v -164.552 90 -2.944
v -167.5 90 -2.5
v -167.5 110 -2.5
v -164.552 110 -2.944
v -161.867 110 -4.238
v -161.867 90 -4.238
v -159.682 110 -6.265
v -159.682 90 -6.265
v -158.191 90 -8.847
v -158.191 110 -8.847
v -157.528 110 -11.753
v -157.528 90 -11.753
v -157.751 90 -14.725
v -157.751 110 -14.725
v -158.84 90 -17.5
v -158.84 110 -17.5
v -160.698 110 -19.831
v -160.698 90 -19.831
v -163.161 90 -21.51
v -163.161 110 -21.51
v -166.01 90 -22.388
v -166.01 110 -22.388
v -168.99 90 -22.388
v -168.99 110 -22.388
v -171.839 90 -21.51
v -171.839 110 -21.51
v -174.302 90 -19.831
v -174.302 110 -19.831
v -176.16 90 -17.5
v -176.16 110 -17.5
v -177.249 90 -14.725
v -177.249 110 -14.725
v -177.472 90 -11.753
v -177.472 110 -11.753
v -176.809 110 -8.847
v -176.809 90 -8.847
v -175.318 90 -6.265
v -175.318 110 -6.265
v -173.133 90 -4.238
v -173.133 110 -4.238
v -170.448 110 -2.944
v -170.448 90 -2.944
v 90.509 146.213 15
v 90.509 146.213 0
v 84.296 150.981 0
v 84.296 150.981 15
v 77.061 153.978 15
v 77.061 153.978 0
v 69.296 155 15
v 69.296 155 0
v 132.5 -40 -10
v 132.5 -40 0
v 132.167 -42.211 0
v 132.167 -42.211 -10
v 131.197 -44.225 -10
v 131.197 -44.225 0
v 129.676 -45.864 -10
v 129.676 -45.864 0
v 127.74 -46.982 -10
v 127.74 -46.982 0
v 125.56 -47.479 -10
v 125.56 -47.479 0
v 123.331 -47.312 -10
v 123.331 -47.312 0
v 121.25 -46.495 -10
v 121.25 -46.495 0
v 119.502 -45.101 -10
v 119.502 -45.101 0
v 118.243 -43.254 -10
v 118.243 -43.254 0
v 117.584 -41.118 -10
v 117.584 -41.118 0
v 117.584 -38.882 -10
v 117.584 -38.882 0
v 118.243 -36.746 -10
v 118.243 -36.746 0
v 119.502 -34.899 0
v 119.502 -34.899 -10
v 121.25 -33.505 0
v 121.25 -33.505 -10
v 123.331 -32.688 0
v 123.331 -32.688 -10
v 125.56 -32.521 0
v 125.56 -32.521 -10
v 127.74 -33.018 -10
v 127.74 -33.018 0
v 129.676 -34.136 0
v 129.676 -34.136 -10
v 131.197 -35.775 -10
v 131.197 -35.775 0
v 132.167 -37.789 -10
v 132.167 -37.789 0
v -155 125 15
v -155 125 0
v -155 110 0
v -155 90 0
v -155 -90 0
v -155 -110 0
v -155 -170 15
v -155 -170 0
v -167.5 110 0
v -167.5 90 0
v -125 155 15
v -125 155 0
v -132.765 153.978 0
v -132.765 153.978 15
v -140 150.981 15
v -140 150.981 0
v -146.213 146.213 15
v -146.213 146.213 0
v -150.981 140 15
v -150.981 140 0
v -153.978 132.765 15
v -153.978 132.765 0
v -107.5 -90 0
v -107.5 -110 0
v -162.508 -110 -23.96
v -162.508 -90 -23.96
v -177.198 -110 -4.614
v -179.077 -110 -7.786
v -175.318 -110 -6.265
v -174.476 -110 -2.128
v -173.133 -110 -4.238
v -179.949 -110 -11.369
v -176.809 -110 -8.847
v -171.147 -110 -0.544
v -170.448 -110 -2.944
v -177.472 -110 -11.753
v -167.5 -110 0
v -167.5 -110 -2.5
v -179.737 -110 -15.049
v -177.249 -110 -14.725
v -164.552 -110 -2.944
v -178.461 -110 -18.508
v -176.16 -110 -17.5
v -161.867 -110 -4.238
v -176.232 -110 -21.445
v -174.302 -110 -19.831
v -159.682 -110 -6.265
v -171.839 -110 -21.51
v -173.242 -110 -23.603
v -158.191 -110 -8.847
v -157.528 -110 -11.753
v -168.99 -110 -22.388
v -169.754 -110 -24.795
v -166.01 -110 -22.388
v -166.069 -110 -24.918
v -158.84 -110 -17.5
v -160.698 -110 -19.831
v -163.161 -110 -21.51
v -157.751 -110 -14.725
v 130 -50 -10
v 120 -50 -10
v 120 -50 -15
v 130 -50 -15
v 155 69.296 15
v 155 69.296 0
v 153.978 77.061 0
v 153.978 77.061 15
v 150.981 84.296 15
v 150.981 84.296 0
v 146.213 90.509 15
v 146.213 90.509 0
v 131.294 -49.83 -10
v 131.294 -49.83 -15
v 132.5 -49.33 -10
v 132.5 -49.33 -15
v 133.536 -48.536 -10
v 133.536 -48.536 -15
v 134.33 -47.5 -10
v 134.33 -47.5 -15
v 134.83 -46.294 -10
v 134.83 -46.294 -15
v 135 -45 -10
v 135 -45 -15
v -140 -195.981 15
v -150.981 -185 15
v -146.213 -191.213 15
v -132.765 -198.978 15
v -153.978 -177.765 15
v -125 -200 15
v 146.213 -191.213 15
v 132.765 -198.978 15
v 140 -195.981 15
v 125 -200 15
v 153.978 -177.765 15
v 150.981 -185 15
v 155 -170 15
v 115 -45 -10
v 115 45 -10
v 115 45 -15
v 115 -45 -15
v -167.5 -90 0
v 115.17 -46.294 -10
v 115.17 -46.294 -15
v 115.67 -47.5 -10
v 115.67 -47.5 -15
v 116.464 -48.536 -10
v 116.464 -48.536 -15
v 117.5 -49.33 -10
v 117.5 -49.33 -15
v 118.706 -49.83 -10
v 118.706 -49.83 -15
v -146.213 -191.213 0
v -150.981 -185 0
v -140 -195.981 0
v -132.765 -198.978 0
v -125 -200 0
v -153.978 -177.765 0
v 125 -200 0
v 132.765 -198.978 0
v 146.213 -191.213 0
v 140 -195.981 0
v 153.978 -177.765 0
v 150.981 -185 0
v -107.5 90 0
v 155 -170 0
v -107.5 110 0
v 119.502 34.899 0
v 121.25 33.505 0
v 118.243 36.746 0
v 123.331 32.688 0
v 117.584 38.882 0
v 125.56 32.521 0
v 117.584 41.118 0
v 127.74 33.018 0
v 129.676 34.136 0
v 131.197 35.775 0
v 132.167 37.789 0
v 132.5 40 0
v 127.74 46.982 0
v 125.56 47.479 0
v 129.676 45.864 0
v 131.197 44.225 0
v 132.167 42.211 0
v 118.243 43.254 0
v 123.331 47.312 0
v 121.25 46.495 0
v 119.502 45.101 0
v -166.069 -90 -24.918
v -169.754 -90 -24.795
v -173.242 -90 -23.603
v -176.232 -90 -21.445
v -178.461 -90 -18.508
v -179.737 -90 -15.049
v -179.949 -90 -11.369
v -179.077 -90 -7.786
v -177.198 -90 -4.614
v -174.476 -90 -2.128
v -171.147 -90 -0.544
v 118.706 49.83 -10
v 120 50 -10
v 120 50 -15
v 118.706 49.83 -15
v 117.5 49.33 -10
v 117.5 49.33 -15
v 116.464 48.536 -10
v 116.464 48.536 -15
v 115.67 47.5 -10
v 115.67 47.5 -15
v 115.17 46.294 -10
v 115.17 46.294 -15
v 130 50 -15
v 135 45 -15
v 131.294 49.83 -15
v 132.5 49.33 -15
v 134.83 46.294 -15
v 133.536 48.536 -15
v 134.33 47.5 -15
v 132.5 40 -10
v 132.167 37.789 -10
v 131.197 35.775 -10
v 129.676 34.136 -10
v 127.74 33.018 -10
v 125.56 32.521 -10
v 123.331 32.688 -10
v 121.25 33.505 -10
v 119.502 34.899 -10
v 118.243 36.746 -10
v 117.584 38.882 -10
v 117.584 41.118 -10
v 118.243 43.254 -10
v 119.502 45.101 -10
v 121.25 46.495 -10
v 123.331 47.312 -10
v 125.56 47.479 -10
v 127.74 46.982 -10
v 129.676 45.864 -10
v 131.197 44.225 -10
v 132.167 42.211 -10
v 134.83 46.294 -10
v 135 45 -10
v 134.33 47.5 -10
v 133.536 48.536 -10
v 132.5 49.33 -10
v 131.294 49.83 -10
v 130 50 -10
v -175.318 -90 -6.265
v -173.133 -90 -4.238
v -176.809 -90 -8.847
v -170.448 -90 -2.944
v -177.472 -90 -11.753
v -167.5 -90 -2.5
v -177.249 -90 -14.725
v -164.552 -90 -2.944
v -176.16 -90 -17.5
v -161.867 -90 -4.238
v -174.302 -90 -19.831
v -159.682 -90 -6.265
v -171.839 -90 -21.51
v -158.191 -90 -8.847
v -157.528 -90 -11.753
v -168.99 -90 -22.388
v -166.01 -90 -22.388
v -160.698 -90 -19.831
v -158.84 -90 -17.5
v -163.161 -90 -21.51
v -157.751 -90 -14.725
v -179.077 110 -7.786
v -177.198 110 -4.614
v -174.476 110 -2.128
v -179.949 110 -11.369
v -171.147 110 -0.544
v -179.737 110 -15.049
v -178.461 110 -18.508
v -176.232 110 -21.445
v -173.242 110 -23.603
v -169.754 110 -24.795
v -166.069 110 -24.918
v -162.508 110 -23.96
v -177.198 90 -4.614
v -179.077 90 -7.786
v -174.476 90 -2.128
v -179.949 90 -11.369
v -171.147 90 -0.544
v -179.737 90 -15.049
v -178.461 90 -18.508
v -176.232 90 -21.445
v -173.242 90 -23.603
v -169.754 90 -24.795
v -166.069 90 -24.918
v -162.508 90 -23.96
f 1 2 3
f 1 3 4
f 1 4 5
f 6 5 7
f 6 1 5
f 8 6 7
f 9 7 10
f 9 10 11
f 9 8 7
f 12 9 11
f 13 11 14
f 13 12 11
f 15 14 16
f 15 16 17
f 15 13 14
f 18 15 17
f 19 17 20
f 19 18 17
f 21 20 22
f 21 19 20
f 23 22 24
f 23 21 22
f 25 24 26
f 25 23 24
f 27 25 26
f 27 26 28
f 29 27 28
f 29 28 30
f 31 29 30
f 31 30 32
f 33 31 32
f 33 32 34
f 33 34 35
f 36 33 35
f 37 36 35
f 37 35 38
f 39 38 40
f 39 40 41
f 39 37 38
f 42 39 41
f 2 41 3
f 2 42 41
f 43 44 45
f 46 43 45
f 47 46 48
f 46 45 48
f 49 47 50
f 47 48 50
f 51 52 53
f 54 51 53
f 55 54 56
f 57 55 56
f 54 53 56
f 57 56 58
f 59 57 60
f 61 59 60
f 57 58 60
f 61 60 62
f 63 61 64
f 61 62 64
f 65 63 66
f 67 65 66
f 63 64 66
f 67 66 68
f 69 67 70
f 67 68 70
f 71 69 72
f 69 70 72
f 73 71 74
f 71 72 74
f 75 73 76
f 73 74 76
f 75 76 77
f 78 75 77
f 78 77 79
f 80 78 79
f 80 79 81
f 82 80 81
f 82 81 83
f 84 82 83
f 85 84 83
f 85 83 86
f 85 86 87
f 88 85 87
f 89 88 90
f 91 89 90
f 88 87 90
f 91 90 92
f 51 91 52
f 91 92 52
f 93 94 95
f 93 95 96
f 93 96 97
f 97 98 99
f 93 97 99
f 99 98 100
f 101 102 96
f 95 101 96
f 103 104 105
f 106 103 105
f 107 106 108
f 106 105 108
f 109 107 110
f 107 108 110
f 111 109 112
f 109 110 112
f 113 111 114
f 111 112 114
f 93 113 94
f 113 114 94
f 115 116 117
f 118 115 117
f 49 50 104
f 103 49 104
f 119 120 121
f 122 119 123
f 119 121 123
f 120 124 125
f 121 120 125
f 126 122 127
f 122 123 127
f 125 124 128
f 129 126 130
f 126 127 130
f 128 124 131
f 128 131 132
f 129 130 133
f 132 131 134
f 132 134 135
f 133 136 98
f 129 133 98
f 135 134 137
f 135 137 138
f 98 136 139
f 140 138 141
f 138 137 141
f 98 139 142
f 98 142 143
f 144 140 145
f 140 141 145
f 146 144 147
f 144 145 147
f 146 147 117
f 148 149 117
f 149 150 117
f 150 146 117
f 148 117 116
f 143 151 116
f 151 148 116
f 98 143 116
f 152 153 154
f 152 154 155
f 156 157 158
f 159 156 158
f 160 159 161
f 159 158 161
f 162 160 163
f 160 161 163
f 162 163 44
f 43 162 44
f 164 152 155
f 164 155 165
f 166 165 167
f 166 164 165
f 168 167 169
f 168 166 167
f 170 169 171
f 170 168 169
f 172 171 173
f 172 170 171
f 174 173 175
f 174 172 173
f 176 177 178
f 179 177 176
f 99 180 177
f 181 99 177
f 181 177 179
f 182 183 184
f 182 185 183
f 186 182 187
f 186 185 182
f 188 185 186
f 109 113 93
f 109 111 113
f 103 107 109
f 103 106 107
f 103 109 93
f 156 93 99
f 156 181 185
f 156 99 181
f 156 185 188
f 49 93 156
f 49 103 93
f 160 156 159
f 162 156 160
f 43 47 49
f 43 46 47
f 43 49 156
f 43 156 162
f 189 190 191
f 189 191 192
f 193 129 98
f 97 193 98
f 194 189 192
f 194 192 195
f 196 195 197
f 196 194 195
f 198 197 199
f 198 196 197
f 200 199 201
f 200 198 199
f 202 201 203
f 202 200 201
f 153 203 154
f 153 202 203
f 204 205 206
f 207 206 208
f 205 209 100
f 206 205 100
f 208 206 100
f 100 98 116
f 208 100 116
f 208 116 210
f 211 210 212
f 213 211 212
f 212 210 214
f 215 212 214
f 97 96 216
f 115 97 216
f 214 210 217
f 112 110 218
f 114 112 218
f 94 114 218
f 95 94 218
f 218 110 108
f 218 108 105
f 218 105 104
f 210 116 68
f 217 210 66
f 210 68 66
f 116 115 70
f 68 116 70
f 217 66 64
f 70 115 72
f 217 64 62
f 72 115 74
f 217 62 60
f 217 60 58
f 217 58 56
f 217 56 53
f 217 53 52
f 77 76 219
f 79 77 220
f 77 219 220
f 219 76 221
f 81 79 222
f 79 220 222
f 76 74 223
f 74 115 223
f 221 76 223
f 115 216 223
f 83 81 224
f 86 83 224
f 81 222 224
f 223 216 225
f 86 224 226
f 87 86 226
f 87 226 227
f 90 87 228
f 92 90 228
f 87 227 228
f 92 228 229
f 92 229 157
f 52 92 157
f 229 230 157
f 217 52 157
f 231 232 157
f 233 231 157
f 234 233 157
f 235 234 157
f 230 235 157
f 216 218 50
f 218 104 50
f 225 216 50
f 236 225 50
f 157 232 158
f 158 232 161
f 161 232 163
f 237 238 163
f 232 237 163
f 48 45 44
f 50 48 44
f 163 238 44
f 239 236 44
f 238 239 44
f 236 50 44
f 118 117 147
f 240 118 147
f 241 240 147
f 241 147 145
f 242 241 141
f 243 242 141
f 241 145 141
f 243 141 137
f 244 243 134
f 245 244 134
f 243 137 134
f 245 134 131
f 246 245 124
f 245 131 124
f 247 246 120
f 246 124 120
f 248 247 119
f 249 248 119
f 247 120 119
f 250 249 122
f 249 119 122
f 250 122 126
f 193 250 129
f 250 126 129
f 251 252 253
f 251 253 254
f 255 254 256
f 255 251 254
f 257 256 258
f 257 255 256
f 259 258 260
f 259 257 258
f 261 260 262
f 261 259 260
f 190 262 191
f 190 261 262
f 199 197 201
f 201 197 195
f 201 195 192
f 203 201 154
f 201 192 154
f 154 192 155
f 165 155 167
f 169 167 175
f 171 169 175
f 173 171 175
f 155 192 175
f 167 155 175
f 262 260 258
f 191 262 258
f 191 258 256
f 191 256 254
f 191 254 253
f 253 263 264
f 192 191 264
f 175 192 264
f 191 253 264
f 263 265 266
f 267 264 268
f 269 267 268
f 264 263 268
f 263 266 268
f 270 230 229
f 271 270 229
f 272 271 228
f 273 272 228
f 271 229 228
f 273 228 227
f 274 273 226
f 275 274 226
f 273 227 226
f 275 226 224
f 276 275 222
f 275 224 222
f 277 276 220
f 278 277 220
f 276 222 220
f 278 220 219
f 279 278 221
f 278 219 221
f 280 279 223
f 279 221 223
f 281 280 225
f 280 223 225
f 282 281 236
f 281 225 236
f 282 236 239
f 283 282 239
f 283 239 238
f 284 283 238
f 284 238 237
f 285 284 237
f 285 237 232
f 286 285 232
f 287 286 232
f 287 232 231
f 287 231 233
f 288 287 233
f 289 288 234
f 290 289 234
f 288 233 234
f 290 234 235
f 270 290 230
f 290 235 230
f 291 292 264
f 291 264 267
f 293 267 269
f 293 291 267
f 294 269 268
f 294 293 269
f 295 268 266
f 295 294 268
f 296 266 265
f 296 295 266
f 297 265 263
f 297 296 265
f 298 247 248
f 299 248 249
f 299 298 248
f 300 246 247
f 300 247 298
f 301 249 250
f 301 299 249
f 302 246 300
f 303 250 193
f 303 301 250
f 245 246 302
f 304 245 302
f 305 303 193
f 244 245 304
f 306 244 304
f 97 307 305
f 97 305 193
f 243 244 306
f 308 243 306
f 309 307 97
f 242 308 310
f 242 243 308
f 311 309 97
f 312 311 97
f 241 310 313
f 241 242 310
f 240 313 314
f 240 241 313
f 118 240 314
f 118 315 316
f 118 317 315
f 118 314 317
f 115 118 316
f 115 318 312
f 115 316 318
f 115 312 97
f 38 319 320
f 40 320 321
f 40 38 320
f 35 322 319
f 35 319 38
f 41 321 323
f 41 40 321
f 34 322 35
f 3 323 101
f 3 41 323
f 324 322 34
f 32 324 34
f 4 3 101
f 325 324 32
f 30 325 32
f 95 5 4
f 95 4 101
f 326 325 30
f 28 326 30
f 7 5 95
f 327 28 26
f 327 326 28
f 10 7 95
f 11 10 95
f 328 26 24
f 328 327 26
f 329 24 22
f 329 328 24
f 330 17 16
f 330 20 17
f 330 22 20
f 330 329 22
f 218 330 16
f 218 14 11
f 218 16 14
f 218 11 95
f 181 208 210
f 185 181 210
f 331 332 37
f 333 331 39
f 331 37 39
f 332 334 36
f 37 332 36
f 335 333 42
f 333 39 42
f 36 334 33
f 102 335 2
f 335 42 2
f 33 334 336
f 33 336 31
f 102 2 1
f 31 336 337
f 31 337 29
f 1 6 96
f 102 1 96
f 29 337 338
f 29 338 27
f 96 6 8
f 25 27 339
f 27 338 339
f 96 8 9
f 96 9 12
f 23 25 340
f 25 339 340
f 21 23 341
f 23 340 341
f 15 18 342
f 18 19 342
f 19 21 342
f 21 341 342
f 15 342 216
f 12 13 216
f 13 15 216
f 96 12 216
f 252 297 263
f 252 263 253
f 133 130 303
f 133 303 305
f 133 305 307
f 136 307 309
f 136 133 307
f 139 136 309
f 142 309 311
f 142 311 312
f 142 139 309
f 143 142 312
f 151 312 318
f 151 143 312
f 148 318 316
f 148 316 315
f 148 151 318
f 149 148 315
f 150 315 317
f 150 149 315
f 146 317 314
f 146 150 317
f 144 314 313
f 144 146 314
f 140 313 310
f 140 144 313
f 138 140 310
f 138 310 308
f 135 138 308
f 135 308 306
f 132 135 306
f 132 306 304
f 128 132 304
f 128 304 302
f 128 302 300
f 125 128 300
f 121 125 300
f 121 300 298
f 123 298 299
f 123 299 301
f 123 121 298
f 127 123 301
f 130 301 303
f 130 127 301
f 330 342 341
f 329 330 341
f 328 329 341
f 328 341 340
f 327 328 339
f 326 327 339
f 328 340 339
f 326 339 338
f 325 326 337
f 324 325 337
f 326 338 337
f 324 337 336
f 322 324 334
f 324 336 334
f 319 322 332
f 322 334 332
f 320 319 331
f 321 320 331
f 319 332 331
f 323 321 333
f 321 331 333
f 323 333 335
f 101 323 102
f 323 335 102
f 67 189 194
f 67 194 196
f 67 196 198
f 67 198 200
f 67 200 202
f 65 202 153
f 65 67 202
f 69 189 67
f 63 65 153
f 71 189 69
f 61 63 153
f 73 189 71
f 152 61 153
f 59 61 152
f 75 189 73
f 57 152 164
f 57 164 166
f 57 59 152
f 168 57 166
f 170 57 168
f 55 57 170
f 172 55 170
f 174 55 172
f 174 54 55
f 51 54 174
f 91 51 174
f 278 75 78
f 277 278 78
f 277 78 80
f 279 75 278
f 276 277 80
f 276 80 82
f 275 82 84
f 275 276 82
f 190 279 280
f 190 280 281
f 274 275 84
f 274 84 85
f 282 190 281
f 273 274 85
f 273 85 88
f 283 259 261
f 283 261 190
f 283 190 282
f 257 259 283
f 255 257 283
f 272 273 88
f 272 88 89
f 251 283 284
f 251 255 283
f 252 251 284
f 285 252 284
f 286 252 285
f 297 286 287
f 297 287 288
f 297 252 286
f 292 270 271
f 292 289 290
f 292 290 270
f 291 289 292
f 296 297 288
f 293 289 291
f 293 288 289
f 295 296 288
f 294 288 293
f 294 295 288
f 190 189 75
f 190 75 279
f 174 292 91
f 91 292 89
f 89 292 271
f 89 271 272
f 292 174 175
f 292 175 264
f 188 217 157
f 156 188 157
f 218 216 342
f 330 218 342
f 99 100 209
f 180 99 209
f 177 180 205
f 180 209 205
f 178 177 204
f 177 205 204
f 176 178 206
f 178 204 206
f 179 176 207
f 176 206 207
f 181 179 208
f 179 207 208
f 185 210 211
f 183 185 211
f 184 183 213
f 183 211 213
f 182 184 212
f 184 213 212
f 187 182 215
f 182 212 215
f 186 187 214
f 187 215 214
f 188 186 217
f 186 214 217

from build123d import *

# Parameters (mm, degrees)
BOSS_EXTRUDE1_DEPTH      = 15
BOSS_EXTRUDE2_DEPTH      = 10
BOSS_EXTRUDE2_DEPTH_BACK = 10
SKETCH3_R                = 12.5
SKETCH3_R_2              = 10
BOSS_EXTRUDE3_DEPTH      = 10
BOSS_EXTRUDE3_DEPTH_BACK = 10
SKETCH4_R                = 12.5
SKETCH4_R_2              = 10
CUT_EXTRUDE1_DEPTH       = 46
SKETCH6_R                = 7.5
BOSS_EXTRUDE4_DEPTH      = 10
BOSS_EXTRUDE5_DEPTH      = 5


with BuildPart() as part:
    # Sketch1 → Boss-Extrude1 (new body)
    with BuildSketch(Plane.XY):
        Polygon((-155, 155), (-155, -200), (155, -200), (155, 81.722524266), (81.722524266, 155), align=None)
    extrude(amount=BOSS_EXTRUDE1_DEPTH)

    # Sketch3 → Boss-Extrude2 (add, two sides: drawn at the far end of the back side and taken through both)
    # profile 1 of 2: a face of its own
    with BuildSketch(Plane(origin=(0, 100, 0), x_dir=(1, 0, 0), z_dir=(0, 1, 0)).offset(-BOSS_EXTRUDE2_DEPTH_BACK)):
        with BuildLine():
            ThreePointArc((-155, 12.5), (-158.661165235, 3.661165235), (-167.5, 0))
            Line((-167.5, 0), (-107.5, 0))
            Line((-107.5, 0), (-162.508319468, 23.960066556))
            ThreePointArc((-162.508319468, 23.960066556), (-157.04423588, 19.350328216), (-155, 12.5))
        make_face()
    # profile 2 of 2: a face of its own
    with BuildSketch(Plane(origin=(0, 100, 0), x_dir=(1, 0, 0), z_dir=(0, 1, 0)).offset(-BOSS_EXTRUDE2_DEPTH_BACK)):
        with Locations((-167.5, 12.5)):
            Circle(SKETCH3_R)
        with Locations(Location((-167.5, 12.5, 0), (0, 0, 270))):
            Circle(SKETCH3_R_2, mode=Mode.SUBTRACT)
    extrude(amount=BOSS_EXTRUDE2_DEPTH + BOSS_EXTRUDE2_DEPTH_BACK)

    # Sketch4 → Boss-Extrude3 (add, two sides: drawn at the far end of the back side and taken through both)
    # profile 1 of 2: a face of its own
    with BuildSketch(Plane(origin=(0, -100, 0), x_dir=(1, 0, 0), z_dir=(0, 1, 0)).offset(-BOSS_EXTRUDE3_DEPTH_BACK)):
        with Locations((-167.5, 12.5)):
            Circle(SKETCH4_R)
        with Locations(Location((-167.5, 12.5, 0), (0, 0, 270))):
            Circle(SKETCH4_R_2, mode=Mode.SUBTRACT)
    # profile 2 of 2: a face of its own
    with BuildSketch(Plane(origin=(0, -100, 0), x_dir=(1, 0, 0), z_dir=(0, 1, 0)).offset(-BOSS_EXTRUDE3_DEPTH_BACK)):
        with BuildLine():
            Line((-107.5, 0), (-162.508319468, 23.960066556))
            ThreePointArc((-162.508319468, 23.960066556), (-157.04423588, 19.350328216), (-155, 12.5))
            ThreePointArc((-155, 12.5), (-158.661165235, 3.661165235), (-167.5, 0))
            Line((-167.5, 0), (-107.5, 0))
        make_face()
    extrude(amount=BOSS_EXTRUDE3_DEPTH + BOSS_EXTRUDE3_DEPTH_BACK)

    # Sketch5 → Cut-Extrude1 (cut)
    with BuildSketch(Plane(origin=(0, 0, 0), x_dir=(-1, 0, 0), z_dir=(0, 0, -1))):
        with BuildLine():
            ThreePointArc((-125, -200), (-146.213203436, -191.213203436), (-155, -170))
            Line((-155, -170), (-155, -200))
            Line((-155, -200), (-125, -200))
        make_face()
        with BuildLine():
            ThreePointArc((155, -170), (146.213203436, -191.213203436), (125, -200))
            Line((125, -200), (155, -200))
            Line((155, -200), (155, -170))
        make_face()
        with BuildLine():
            Line((155, 155), (125, 155))
            ThreePointArc((125, 155), (146.213203436, 146.213203436), (155, 125))
            Line((155, 125), (155, 155))
        make_face()
        with BuildLine():
            Line((-81.722524266, 155), (-90.50932083, 146.213203436))
            ThreePointArc((-90.50932083, 146.213203436), (-80.776620365, 152.716385975), (-69.296117394, 155))
            Line((-69.296117394, 155), (-81.722524266, 155))
        make_face()
        with BuildLine():
            ThreePointArc((-155, 69.296117394), (-152.716385975, 80.776620365), (-146.213203436, 90.50932083))
            Line((-146.213203436, 90.50932083), (-155, 81.722524266))
            Line((-155, 81.722524266), (-155, 69.296117394))
        make_face()
    extrude(amount=-CUT_EXTRUDE1_DEPTH, mode=Mode.SUBTRACT)

    # Sketch6 → Boss-Extrude4 (add)
    with BuildSketch(Plane(origin=(0, 0, 0), x_dir=(-1, 0, 0), z_dir=(0, 0, -1))):
        with Locations(Location((-125, 40, 0), (0, 0, 180))):
            Circle(SKETCH6_R)
        with Locations(Location((-125, -40, 0), (0, 0, 180))):
            Circle(SKETCH6_R)
    extrude(amount=BOSS_EXTRUDE4_DEPTH)

    # Sketch7 → Boss-Extrude5 (add)
    with BuildSketch(Plane(origin=(0, 0, -10), x_dir=(-1, 0, 0), z_dir=(0, 0, -1))):
        with BuildLine():
            Line((-130, 50), (-120, 50))
            ThreePointArc((-120, 50), (-116.464466094, 48.535533906), (-115, 45))
            Line((-115, 45), (-115, -45))
            ThreePointArc((-115, -45), (-116.464466094, -48.535533906), (-120, -50))
            Line((-120, -50), (-130, -50))
            ThreePointArc((-130, -50), (-133.535533906, -48.535533906), (-135, -45))
            Line((-135, -45), (-135, 45))
            ThreePointArc((-135, 45), (-133.535533906, 48.535533906), (-130, 50))
        make_face()
    extrude(amount=BOSS_EXTRUDE5_DEPTH)


solid = part.part
